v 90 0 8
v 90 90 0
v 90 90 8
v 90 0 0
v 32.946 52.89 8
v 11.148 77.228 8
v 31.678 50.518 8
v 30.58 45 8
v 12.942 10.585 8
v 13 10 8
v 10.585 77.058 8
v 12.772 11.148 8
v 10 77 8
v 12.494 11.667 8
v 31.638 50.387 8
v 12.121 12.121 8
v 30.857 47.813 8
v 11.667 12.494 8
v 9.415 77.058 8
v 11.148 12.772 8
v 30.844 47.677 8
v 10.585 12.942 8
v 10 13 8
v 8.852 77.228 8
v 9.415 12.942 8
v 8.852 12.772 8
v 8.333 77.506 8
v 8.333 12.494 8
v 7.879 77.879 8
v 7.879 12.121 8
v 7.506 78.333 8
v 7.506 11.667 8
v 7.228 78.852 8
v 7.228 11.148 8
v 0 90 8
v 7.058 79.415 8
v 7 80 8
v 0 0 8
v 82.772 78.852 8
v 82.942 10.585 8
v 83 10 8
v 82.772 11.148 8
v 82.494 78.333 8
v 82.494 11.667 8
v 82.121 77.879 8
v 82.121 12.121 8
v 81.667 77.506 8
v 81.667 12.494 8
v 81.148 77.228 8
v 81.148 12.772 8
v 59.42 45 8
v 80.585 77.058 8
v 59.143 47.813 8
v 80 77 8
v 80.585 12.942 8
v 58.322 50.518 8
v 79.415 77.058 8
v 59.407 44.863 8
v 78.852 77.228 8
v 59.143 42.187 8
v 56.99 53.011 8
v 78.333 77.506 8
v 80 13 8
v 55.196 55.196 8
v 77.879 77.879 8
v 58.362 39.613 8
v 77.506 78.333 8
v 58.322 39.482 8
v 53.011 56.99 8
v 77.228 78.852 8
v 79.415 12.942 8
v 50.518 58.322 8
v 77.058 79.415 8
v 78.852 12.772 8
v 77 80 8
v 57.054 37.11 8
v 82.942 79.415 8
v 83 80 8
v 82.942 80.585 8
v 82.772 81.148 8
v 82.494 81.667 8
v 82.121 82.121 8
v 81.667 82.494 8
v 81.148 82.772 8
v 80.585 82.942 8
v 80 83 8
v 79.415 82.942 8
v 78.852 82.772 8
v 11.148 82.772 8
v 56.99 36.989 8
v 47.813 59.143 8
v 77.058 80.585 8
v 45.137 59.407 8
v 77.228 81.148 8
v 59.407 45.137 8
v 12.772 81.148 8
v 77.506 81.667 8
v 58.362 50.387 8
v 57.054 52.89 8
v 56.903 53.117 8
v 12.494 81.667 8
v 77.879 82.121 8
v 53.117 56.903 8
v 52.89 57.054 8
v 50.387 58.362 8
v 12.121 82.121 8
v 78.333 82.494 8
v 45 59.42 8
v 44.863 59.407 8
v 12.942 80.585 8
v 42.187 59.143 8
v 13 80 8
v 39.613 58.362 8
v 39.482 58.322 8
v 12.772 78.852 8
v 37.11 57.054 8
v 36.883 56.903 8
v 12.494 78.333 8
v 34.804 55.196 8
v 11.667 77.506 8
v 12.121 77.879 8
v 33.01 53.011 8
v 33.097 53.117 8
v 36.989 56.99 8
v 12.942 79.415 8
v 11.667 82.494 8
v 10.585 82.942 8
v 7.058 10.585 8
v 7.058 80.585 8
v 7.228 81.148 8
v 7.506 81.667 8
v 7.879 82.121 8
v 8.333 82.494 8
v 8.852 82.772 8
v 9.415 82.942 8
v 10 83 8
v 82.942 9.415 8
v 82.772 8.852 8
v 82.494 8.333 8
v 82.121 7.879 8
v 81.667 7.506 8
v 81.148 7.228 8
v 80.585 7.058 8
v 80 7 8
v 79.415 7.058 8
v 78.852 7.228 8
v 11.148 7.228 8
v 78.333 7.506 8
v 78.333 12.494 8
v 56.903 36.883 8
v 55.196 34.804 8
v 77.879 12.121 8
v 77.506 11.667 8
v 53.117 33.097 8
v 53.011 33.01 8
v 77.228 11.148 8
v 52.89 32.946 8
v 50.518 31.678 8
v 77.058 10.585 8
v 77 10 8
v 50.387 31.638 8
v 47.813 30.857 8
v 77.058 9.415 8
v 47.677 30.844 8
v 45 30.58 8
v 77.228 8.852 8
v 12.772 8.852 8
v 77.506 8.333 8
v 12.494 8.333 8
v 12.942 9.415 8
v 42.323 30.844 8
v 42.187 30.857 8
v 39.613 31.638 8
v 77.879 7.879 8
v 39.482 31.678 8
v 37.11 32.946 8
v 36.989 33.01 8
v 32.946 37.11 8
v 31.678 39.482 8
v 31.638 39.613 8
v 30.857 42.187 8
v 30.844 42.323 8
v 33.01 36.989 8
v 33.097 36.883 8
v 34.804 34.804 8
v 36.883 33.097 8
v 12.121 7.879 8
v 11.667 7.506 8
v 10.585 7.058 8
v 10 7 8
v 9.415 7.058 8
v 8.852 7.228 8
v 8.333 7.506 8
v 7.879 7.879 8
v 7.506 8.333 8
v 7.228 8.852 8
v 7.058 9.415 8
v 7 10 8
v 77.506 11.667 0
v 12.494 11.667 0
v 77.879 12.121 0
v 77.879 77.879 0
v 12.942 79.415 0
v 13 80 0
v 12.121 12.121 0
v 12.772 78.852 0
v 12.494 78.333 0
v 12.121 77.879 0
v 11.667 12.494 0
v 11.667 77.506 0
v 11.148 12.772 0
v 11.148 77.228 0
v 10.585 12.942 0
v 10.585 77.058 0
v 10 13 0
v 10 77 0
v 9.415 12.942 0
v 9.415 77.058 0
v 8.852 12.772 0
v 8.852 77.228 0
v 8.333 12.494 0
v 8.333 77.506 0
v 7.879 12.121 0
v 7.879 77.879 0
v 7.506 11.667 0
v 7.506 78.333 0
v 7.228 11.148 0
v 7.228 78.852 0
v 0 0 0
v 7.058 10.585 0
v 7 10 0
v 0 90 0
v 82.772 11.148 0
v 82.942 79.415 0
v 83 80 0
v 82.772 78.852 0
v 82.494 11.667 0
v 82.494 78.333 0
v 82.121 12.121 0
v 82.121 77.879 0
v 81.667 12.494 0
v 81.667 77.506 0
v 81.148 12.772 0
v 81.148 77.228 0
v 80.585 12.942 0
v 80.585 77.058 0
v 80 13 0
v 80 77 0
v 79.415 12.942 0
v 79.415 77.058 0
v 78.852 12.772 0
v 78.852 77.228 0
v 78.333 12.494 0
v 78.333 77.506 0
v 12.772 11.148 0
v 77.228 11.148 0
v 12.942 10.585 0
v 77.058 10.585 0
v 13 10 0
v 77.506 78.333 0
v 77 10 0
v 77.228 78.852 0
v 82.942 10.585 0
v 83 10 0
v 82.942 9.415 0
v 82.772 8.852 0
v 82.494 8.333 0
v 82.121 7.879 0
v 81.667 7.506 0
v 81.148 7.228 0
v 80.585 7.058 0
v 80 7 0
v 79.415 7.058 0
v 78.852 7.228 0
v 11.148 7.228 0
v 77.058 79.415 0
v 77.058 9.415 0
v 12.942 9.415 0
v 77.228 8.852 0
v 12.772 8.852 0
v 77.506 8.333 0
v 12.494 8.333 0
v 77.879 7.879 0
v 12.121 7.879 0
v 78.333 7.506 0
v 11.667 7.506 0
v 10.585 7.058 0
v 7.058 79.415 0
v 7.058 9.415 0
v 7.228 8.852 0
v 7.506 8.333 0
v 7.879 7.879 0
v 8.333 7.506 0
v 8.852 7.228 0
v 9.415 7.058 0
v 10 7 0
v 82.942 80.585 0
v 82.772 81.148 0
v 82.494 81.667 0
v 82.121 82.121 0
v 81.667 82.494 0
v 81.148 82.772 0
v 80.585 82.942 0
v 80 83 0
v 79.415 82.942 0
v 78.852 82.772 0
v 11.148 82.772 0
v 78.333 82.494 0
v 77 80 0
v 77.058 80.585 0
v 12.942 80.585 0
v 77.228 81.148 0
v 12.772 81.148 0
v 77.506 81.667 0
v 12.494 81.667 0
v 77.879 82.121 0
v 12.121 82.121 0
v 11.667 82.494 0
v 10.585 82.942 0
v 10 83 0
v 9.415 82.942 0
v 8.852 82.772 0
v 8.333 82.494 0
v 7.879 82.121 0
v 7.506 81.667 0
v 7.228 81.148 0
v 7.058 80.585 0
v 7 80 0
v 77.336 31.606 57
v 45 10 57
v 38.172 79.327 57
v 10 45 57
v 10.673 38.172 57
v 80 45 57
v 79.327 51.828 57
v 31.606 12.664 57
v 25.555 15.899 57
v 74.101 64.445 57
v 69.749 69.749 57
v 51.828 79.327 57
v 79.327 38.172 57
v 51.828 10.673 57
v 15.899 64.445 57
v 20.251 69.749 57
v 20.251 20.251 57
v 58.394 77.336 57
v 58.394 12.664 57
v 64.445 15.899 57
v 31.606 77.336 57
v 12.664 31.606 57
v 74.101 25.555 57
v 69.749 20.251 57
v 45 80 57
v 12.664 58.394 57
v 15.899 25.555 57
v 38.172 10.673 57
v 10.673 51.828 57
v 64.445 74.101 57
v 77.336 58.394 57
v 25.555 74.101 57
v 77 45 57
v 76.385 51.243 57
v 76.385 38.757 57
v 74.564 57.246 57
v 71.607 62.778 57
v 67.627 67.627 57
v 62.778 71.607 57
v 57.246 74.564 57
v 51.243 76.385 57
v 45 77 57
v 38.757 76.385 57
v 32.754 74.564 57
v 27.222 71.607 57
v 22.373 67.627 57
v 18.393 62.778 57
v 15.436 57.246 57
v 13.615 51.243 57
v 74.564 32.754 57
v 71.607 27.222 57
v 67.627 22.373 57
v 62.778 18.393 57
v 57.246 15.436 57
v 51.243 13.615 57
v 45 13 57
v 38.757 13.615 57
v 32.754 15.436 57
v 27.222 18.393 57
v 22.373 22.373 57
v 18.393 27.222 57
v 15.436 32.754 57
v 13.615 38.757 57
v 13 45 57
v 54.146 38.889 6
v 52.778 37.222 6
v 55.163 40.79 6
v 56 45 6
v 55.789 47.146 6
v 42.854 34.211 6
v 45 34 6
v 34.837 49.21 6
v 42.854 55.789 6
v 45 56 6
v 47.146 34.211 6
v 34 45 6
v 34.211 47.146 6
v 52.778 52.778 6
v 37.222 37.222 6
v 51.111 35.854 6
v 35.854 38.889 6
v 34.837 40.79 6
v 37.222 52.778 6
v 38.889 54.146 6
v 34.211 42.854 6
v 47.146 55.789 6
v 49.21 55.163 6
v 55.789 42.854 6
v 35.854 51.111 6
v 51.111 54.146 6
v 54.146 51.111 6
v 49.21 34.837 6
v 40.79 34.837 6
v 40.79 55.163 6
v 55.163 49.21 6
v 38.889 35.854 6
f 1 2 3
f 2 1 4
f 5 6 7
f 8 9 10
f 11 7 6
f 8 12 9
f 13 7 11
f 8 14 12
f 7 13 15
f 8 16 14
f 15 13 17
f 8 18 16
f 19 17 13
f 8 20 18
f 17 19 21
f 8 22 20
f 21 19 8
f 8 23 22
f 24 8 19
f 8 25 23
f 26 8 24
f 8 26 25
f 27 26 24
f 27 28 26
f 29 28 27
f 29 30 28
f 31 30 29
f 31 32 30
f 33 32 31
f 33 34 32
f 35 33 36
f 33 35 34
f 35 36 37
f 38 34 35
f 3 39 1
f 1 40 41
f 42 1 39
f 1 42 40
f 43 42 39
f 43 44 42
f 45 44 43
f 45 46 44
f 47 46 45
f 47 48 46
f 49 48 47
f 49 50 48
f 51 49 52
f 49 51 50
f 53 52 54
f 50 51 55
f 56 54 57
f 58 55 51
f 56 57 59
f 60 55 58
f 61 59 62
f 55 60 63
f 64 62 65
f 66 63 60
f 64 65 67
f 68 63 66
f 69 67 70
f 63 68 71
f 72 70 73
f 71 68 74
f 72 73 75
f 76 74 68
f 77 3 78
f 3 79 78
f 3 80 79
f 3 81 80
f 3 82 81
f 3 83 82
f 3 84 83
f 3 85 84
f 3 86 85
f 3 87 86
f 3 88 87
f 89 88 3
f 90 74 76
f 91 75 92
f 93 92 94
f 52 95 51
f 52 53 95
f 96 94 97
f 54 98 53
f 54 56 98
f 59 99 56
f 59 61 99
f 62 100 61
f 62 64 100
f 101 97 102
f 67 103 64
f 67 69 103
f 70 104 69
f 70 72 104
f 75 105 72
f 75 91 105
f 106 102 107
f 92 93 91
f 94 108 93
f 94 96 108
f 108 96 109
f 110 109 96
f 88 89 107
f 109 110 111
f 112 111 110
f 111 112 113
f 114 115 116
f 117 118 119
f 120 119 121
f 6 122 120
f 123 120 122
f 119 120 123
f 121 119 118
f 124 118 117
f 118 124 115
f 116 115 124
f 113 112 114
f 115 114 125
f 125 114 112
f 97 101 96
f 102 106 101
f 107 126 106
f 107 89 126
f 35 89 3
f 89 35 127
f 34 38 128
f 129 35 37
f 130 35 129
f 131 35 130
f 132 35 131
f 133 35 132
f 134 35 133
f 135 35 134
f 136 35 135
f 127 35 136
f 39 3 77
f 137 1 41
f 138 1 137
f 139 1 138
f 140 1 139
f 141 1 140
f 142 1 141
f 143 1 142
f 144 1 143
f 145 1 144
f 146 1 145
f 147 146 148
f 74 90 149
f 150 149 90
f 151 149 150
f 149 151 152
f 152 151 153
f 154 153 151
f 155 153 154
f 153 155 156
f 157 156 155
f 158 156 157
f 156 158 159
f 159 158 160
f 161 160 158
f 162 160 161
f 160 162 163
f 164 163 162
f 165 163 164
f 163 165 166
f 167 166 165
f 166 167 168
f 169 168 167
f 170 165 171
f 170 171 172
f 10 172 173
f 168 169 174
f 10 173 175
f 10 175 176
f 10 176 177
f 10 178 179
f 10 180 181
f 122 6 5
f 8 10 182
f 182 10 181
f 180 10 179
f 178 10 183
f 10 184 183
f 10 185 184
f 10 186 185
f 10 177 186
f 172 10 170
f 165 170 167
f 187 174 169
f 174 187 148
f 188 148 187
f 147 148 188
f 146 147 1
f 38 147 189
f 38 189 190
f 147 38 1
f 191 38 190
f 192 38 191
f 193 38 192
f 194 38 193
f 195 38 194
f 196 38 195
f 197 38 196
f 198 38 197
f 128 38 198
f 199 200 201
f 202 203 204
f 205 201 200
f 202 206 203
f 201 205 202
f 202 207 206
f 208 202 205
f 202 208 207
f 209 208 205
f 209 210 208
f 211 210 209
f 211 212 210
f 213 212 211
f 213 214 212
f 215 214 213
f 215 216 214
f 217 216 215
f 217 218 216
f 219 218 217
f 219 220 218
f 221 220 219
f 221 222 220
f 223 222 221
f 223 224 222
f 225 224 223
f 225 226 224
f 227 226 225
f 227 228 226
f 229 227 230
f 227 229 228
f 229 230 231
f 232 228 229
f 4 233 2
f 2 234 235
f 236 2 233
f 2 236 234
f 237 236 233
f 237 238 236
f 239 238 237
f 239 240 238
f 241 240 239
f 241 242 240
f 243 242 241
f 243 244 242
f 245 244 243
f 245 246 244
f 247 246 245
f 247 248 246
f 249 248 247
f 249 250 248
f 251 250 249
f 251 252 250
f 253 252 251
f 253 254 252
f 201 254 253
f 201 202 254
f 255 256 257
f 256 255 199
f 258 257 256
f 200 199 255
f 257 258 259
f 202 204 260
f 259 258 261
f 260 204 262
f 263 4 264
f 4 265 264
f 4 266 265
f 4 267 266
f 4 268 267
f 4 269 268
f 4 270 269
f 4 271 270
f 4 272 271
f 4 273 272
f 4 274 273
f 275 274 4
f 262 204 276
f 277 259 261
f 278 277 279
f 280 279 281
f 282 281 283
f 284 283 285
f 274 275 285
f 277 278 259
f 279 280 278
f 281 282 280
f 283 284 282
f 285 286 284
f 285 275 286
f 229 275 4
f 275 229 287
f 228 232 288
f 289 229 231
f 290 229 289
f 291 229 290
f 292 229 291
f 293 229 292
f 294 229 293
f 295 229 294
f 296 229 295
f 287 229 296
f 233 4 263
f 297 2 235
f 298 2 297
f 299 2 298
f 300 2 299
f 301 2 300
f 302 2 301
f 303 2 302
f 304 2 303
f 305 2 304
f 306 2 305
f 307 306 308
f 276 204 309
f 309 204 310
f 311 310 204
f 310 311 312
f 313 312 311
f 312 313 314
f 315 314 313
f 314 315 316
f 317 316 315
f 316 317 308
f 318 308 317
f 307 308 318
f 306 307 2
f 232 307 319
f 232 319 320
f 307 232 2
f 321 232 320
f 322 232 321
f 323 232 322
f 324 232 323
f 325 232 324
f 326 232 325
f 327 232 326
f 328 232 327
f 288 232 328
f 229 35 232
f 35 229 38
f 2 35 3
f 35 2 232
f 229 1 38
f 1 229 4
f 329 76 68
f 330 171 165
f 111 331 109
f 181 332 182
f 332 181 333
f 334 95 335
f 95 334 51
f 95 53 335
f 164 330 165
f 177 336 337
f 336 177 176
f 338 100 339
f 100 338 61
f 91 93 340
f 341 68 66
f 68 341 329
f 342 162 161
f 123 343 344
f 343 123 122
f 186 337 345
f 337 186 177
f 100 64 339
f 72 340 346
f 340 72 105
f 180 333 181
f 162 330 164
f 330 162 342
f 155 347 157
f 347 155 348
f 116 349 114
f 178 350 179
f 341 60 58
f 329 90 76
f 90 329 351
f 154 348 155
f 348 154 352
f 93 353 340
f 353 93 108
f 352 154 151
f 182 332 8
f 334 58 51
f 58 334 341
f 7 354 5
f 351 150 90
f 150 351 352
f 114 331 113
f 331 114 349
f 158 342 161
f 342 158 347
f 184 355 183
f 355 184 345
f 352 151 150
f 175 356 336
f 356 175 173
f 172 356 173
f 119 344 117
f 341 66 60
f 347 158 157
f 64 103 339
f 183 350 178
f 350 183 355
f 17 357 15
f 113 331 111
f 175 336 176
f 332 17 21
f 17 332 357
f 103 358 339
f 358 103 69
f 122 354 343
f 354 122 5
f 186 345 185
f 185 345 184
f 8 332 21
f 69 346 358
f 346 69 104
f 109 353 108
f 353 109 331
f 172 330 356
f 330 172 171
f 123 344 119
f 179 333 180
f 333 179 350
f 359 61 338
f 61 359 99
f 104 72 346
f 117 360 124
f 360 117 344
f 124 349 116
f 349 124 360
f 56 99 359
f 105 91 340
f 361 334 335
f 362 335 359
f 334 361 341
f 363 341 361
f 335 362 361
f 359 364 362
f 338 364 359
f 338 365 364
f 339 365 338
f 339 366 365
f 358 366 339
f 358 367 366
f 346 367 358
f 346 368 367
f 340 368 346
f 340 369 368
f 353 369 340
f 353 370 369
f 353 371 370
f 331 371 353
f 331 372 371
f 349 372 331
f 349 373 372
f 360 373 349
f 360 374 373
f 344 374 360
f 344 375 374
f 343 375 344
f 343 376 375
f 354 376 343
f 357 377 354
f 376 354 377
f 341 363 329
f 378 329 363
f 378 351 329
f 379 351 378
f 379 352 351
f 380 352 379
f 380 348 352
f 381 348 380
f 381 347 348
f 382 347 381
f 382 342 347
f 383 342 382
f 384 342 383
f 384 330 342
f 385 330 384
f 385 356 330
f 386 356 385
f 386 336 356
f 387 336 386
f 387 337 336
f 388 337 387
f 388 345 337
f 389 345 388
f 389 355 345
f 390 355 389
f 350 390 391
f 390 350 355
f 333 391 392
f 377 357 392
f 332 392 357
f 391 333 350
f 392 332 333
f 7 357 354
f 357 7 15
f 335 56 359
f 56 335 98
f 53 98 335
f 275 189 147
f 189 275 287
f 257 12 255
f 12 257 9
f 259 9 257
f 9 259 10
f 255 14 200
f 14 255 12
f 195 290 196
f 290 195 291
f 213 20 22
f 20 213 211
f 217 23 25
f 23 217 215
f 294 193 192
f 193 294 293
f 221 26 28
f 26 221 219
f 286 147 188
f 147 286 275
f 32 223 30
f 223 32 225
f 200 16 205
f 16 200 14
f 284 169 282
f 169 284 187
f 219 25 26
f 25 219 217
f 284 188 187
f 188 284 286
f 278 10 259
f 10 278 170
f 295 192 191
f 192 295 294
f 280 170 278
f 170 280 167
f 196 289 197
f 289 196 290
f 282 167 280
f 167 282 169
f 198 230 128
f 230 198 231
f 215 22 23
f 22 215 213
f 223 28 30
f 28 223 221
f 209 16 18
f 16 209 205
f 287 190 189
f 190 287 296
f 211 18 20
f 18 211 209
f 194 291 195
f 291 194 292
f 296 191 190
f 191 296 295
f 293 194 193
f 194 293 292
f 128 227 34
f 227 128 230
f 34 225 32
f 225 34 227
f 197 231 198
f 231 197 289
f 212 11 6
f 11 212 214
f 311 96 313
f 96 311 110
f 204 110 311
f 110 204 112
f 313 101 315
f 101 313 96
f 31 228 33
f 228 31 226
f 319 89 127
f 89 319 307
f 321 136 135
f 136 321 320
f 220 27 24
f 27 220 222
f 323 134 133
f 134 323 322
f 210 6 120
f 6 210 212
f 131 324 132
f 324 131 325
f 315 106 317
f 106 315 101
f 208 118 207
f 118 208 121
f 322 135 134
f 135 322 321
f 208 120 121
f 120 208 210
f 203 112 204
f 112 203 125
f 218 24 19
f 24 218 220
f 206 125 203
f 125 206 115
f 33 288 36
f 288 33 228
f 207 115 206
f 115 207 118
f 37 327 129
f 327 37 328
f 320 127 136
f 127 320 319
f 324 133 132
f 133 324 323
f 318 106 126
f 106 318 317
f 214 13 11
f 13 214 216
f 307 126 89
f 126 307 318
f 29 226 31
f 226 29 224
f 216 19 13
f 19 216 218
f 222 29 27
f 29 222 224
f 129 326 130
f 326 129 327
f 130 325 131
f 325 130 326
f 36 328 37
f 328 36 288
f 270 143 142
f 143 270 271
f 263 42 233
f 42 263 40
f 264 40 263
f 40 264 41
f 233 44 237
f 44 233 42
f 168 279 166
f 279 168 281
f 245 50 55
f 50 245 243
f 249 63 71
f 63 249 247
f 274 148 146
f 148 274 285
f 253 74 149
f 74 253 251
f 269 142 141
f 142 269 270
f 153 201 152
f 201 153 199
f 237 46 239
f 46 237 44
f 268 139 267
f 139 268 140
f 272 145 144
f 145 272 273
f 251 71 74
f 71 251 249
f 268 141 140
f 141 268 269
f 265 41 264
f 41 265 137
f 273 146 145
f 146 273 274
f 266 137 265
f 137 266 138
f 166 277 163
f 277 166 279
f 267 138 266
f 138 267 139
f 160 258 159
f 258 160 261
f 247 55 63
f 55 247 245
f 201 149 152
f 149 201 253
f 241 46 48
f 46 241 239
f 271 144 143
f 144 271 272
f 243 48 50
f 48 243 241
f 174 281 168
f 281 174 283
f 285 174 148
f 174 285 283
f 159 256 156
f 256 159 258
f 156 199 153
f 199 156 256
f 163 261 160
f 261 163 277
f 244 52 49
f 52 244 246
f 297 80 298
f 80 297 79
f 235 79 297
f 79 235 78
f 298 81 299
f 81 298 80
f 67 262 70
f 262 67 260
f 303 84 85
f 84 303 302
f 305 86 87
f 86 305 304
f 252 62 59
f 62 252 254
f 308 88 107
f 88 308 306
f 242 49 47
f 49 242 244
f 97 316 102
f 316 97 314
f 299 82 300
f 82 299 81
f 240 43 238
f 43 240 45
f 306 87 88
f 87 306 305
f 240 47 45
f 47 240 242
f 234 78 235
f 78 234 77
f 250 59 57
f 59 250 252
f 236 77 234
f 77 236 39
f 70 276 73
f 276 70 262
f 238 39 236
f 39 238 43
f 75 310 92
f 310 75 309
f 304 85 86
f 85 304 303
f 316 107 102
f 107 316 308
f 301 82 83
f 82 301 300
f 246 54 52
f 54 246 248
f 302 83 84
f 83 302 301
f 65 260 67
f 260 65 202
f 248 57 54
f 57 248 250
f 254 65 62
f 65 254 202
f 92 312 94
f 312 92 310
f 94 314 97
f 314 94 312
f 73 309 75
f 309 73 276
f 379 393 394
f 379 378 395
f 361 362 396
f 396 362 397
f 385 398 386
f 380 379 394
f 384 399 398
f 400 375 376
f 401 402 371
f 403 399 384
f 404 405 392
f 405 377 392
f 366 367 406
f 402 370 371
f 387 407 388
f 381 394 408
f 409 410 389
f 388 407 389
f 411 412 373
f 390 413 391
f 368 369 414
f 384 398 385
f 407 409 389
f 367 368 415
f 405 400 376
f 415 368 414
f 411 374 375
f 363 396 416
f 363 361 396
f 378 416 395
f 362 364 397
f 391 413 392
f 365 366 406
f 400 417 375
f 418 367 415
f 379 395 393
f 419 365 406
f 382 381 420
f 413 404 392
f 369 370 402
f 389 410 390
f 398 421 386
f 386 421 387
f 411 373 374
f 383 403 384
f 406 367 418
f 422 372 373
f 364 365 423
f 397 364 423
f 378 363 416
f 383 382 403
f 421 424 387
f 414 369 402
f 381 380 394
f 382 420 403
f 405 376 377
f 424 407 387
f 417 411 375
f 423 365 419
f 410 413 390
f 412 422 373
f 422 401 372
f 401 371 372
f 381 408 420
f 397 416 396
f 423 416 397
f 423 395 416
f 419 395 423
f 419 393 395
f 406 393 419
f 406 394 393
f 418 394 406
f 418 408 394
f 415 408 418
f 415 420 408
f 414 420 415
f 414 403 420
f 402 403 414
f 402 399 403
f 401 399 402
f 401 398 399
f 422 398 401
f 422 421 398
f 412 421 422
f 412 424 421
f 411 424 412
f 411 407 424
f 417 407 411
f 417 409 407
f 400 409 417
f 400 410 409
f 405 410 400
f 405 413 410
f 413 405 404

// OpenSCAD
$fn = 32;

// ----------------------------------------------------------------------
// Hopper: flanged with square flange
// ----------------------------------------------------------------------

// --- parameters (mm) ---
fl = 90;                  // flange side, X and Y
fl_t = 8;                 // flange thickness
cone_h = 50;              // cone height above the flange
top_d = 70;               // cone mouth diameter
bot_d = 28;               // cone spout diameter
wall = 3;                 // cone wall thickness
hole_r = 3;               // flange hole radius
hole_in = 10;             // hole inset from the corners

bore_d = bot_d - 2 * wall;  // spout bore diameter
total_h = fl_t + cone_h - 1;  // overall height

difference() {
  union() {
    cube([fl, fl, fl_t]);
    translate([fl / 2, fl / 2, fl_t - 1])
      cylinder(h = cone_h, d1 = bot_d, d2 = top_d);
  }
  translate([fl / 2, fl / 2, fl_t - 2])
    cylinder(h = cone_h + 1, d1 = bore_d, d2 = top_d - 2 * wall);
  for (sx = [0, 1], sy = [0, 1])
    translate([sx ? fl - hole_in : hole_in,
               sy ? fl - hole_in : hole_in, -1])
      cylinder(r = hole_r, h = fl_t + 2);
}
